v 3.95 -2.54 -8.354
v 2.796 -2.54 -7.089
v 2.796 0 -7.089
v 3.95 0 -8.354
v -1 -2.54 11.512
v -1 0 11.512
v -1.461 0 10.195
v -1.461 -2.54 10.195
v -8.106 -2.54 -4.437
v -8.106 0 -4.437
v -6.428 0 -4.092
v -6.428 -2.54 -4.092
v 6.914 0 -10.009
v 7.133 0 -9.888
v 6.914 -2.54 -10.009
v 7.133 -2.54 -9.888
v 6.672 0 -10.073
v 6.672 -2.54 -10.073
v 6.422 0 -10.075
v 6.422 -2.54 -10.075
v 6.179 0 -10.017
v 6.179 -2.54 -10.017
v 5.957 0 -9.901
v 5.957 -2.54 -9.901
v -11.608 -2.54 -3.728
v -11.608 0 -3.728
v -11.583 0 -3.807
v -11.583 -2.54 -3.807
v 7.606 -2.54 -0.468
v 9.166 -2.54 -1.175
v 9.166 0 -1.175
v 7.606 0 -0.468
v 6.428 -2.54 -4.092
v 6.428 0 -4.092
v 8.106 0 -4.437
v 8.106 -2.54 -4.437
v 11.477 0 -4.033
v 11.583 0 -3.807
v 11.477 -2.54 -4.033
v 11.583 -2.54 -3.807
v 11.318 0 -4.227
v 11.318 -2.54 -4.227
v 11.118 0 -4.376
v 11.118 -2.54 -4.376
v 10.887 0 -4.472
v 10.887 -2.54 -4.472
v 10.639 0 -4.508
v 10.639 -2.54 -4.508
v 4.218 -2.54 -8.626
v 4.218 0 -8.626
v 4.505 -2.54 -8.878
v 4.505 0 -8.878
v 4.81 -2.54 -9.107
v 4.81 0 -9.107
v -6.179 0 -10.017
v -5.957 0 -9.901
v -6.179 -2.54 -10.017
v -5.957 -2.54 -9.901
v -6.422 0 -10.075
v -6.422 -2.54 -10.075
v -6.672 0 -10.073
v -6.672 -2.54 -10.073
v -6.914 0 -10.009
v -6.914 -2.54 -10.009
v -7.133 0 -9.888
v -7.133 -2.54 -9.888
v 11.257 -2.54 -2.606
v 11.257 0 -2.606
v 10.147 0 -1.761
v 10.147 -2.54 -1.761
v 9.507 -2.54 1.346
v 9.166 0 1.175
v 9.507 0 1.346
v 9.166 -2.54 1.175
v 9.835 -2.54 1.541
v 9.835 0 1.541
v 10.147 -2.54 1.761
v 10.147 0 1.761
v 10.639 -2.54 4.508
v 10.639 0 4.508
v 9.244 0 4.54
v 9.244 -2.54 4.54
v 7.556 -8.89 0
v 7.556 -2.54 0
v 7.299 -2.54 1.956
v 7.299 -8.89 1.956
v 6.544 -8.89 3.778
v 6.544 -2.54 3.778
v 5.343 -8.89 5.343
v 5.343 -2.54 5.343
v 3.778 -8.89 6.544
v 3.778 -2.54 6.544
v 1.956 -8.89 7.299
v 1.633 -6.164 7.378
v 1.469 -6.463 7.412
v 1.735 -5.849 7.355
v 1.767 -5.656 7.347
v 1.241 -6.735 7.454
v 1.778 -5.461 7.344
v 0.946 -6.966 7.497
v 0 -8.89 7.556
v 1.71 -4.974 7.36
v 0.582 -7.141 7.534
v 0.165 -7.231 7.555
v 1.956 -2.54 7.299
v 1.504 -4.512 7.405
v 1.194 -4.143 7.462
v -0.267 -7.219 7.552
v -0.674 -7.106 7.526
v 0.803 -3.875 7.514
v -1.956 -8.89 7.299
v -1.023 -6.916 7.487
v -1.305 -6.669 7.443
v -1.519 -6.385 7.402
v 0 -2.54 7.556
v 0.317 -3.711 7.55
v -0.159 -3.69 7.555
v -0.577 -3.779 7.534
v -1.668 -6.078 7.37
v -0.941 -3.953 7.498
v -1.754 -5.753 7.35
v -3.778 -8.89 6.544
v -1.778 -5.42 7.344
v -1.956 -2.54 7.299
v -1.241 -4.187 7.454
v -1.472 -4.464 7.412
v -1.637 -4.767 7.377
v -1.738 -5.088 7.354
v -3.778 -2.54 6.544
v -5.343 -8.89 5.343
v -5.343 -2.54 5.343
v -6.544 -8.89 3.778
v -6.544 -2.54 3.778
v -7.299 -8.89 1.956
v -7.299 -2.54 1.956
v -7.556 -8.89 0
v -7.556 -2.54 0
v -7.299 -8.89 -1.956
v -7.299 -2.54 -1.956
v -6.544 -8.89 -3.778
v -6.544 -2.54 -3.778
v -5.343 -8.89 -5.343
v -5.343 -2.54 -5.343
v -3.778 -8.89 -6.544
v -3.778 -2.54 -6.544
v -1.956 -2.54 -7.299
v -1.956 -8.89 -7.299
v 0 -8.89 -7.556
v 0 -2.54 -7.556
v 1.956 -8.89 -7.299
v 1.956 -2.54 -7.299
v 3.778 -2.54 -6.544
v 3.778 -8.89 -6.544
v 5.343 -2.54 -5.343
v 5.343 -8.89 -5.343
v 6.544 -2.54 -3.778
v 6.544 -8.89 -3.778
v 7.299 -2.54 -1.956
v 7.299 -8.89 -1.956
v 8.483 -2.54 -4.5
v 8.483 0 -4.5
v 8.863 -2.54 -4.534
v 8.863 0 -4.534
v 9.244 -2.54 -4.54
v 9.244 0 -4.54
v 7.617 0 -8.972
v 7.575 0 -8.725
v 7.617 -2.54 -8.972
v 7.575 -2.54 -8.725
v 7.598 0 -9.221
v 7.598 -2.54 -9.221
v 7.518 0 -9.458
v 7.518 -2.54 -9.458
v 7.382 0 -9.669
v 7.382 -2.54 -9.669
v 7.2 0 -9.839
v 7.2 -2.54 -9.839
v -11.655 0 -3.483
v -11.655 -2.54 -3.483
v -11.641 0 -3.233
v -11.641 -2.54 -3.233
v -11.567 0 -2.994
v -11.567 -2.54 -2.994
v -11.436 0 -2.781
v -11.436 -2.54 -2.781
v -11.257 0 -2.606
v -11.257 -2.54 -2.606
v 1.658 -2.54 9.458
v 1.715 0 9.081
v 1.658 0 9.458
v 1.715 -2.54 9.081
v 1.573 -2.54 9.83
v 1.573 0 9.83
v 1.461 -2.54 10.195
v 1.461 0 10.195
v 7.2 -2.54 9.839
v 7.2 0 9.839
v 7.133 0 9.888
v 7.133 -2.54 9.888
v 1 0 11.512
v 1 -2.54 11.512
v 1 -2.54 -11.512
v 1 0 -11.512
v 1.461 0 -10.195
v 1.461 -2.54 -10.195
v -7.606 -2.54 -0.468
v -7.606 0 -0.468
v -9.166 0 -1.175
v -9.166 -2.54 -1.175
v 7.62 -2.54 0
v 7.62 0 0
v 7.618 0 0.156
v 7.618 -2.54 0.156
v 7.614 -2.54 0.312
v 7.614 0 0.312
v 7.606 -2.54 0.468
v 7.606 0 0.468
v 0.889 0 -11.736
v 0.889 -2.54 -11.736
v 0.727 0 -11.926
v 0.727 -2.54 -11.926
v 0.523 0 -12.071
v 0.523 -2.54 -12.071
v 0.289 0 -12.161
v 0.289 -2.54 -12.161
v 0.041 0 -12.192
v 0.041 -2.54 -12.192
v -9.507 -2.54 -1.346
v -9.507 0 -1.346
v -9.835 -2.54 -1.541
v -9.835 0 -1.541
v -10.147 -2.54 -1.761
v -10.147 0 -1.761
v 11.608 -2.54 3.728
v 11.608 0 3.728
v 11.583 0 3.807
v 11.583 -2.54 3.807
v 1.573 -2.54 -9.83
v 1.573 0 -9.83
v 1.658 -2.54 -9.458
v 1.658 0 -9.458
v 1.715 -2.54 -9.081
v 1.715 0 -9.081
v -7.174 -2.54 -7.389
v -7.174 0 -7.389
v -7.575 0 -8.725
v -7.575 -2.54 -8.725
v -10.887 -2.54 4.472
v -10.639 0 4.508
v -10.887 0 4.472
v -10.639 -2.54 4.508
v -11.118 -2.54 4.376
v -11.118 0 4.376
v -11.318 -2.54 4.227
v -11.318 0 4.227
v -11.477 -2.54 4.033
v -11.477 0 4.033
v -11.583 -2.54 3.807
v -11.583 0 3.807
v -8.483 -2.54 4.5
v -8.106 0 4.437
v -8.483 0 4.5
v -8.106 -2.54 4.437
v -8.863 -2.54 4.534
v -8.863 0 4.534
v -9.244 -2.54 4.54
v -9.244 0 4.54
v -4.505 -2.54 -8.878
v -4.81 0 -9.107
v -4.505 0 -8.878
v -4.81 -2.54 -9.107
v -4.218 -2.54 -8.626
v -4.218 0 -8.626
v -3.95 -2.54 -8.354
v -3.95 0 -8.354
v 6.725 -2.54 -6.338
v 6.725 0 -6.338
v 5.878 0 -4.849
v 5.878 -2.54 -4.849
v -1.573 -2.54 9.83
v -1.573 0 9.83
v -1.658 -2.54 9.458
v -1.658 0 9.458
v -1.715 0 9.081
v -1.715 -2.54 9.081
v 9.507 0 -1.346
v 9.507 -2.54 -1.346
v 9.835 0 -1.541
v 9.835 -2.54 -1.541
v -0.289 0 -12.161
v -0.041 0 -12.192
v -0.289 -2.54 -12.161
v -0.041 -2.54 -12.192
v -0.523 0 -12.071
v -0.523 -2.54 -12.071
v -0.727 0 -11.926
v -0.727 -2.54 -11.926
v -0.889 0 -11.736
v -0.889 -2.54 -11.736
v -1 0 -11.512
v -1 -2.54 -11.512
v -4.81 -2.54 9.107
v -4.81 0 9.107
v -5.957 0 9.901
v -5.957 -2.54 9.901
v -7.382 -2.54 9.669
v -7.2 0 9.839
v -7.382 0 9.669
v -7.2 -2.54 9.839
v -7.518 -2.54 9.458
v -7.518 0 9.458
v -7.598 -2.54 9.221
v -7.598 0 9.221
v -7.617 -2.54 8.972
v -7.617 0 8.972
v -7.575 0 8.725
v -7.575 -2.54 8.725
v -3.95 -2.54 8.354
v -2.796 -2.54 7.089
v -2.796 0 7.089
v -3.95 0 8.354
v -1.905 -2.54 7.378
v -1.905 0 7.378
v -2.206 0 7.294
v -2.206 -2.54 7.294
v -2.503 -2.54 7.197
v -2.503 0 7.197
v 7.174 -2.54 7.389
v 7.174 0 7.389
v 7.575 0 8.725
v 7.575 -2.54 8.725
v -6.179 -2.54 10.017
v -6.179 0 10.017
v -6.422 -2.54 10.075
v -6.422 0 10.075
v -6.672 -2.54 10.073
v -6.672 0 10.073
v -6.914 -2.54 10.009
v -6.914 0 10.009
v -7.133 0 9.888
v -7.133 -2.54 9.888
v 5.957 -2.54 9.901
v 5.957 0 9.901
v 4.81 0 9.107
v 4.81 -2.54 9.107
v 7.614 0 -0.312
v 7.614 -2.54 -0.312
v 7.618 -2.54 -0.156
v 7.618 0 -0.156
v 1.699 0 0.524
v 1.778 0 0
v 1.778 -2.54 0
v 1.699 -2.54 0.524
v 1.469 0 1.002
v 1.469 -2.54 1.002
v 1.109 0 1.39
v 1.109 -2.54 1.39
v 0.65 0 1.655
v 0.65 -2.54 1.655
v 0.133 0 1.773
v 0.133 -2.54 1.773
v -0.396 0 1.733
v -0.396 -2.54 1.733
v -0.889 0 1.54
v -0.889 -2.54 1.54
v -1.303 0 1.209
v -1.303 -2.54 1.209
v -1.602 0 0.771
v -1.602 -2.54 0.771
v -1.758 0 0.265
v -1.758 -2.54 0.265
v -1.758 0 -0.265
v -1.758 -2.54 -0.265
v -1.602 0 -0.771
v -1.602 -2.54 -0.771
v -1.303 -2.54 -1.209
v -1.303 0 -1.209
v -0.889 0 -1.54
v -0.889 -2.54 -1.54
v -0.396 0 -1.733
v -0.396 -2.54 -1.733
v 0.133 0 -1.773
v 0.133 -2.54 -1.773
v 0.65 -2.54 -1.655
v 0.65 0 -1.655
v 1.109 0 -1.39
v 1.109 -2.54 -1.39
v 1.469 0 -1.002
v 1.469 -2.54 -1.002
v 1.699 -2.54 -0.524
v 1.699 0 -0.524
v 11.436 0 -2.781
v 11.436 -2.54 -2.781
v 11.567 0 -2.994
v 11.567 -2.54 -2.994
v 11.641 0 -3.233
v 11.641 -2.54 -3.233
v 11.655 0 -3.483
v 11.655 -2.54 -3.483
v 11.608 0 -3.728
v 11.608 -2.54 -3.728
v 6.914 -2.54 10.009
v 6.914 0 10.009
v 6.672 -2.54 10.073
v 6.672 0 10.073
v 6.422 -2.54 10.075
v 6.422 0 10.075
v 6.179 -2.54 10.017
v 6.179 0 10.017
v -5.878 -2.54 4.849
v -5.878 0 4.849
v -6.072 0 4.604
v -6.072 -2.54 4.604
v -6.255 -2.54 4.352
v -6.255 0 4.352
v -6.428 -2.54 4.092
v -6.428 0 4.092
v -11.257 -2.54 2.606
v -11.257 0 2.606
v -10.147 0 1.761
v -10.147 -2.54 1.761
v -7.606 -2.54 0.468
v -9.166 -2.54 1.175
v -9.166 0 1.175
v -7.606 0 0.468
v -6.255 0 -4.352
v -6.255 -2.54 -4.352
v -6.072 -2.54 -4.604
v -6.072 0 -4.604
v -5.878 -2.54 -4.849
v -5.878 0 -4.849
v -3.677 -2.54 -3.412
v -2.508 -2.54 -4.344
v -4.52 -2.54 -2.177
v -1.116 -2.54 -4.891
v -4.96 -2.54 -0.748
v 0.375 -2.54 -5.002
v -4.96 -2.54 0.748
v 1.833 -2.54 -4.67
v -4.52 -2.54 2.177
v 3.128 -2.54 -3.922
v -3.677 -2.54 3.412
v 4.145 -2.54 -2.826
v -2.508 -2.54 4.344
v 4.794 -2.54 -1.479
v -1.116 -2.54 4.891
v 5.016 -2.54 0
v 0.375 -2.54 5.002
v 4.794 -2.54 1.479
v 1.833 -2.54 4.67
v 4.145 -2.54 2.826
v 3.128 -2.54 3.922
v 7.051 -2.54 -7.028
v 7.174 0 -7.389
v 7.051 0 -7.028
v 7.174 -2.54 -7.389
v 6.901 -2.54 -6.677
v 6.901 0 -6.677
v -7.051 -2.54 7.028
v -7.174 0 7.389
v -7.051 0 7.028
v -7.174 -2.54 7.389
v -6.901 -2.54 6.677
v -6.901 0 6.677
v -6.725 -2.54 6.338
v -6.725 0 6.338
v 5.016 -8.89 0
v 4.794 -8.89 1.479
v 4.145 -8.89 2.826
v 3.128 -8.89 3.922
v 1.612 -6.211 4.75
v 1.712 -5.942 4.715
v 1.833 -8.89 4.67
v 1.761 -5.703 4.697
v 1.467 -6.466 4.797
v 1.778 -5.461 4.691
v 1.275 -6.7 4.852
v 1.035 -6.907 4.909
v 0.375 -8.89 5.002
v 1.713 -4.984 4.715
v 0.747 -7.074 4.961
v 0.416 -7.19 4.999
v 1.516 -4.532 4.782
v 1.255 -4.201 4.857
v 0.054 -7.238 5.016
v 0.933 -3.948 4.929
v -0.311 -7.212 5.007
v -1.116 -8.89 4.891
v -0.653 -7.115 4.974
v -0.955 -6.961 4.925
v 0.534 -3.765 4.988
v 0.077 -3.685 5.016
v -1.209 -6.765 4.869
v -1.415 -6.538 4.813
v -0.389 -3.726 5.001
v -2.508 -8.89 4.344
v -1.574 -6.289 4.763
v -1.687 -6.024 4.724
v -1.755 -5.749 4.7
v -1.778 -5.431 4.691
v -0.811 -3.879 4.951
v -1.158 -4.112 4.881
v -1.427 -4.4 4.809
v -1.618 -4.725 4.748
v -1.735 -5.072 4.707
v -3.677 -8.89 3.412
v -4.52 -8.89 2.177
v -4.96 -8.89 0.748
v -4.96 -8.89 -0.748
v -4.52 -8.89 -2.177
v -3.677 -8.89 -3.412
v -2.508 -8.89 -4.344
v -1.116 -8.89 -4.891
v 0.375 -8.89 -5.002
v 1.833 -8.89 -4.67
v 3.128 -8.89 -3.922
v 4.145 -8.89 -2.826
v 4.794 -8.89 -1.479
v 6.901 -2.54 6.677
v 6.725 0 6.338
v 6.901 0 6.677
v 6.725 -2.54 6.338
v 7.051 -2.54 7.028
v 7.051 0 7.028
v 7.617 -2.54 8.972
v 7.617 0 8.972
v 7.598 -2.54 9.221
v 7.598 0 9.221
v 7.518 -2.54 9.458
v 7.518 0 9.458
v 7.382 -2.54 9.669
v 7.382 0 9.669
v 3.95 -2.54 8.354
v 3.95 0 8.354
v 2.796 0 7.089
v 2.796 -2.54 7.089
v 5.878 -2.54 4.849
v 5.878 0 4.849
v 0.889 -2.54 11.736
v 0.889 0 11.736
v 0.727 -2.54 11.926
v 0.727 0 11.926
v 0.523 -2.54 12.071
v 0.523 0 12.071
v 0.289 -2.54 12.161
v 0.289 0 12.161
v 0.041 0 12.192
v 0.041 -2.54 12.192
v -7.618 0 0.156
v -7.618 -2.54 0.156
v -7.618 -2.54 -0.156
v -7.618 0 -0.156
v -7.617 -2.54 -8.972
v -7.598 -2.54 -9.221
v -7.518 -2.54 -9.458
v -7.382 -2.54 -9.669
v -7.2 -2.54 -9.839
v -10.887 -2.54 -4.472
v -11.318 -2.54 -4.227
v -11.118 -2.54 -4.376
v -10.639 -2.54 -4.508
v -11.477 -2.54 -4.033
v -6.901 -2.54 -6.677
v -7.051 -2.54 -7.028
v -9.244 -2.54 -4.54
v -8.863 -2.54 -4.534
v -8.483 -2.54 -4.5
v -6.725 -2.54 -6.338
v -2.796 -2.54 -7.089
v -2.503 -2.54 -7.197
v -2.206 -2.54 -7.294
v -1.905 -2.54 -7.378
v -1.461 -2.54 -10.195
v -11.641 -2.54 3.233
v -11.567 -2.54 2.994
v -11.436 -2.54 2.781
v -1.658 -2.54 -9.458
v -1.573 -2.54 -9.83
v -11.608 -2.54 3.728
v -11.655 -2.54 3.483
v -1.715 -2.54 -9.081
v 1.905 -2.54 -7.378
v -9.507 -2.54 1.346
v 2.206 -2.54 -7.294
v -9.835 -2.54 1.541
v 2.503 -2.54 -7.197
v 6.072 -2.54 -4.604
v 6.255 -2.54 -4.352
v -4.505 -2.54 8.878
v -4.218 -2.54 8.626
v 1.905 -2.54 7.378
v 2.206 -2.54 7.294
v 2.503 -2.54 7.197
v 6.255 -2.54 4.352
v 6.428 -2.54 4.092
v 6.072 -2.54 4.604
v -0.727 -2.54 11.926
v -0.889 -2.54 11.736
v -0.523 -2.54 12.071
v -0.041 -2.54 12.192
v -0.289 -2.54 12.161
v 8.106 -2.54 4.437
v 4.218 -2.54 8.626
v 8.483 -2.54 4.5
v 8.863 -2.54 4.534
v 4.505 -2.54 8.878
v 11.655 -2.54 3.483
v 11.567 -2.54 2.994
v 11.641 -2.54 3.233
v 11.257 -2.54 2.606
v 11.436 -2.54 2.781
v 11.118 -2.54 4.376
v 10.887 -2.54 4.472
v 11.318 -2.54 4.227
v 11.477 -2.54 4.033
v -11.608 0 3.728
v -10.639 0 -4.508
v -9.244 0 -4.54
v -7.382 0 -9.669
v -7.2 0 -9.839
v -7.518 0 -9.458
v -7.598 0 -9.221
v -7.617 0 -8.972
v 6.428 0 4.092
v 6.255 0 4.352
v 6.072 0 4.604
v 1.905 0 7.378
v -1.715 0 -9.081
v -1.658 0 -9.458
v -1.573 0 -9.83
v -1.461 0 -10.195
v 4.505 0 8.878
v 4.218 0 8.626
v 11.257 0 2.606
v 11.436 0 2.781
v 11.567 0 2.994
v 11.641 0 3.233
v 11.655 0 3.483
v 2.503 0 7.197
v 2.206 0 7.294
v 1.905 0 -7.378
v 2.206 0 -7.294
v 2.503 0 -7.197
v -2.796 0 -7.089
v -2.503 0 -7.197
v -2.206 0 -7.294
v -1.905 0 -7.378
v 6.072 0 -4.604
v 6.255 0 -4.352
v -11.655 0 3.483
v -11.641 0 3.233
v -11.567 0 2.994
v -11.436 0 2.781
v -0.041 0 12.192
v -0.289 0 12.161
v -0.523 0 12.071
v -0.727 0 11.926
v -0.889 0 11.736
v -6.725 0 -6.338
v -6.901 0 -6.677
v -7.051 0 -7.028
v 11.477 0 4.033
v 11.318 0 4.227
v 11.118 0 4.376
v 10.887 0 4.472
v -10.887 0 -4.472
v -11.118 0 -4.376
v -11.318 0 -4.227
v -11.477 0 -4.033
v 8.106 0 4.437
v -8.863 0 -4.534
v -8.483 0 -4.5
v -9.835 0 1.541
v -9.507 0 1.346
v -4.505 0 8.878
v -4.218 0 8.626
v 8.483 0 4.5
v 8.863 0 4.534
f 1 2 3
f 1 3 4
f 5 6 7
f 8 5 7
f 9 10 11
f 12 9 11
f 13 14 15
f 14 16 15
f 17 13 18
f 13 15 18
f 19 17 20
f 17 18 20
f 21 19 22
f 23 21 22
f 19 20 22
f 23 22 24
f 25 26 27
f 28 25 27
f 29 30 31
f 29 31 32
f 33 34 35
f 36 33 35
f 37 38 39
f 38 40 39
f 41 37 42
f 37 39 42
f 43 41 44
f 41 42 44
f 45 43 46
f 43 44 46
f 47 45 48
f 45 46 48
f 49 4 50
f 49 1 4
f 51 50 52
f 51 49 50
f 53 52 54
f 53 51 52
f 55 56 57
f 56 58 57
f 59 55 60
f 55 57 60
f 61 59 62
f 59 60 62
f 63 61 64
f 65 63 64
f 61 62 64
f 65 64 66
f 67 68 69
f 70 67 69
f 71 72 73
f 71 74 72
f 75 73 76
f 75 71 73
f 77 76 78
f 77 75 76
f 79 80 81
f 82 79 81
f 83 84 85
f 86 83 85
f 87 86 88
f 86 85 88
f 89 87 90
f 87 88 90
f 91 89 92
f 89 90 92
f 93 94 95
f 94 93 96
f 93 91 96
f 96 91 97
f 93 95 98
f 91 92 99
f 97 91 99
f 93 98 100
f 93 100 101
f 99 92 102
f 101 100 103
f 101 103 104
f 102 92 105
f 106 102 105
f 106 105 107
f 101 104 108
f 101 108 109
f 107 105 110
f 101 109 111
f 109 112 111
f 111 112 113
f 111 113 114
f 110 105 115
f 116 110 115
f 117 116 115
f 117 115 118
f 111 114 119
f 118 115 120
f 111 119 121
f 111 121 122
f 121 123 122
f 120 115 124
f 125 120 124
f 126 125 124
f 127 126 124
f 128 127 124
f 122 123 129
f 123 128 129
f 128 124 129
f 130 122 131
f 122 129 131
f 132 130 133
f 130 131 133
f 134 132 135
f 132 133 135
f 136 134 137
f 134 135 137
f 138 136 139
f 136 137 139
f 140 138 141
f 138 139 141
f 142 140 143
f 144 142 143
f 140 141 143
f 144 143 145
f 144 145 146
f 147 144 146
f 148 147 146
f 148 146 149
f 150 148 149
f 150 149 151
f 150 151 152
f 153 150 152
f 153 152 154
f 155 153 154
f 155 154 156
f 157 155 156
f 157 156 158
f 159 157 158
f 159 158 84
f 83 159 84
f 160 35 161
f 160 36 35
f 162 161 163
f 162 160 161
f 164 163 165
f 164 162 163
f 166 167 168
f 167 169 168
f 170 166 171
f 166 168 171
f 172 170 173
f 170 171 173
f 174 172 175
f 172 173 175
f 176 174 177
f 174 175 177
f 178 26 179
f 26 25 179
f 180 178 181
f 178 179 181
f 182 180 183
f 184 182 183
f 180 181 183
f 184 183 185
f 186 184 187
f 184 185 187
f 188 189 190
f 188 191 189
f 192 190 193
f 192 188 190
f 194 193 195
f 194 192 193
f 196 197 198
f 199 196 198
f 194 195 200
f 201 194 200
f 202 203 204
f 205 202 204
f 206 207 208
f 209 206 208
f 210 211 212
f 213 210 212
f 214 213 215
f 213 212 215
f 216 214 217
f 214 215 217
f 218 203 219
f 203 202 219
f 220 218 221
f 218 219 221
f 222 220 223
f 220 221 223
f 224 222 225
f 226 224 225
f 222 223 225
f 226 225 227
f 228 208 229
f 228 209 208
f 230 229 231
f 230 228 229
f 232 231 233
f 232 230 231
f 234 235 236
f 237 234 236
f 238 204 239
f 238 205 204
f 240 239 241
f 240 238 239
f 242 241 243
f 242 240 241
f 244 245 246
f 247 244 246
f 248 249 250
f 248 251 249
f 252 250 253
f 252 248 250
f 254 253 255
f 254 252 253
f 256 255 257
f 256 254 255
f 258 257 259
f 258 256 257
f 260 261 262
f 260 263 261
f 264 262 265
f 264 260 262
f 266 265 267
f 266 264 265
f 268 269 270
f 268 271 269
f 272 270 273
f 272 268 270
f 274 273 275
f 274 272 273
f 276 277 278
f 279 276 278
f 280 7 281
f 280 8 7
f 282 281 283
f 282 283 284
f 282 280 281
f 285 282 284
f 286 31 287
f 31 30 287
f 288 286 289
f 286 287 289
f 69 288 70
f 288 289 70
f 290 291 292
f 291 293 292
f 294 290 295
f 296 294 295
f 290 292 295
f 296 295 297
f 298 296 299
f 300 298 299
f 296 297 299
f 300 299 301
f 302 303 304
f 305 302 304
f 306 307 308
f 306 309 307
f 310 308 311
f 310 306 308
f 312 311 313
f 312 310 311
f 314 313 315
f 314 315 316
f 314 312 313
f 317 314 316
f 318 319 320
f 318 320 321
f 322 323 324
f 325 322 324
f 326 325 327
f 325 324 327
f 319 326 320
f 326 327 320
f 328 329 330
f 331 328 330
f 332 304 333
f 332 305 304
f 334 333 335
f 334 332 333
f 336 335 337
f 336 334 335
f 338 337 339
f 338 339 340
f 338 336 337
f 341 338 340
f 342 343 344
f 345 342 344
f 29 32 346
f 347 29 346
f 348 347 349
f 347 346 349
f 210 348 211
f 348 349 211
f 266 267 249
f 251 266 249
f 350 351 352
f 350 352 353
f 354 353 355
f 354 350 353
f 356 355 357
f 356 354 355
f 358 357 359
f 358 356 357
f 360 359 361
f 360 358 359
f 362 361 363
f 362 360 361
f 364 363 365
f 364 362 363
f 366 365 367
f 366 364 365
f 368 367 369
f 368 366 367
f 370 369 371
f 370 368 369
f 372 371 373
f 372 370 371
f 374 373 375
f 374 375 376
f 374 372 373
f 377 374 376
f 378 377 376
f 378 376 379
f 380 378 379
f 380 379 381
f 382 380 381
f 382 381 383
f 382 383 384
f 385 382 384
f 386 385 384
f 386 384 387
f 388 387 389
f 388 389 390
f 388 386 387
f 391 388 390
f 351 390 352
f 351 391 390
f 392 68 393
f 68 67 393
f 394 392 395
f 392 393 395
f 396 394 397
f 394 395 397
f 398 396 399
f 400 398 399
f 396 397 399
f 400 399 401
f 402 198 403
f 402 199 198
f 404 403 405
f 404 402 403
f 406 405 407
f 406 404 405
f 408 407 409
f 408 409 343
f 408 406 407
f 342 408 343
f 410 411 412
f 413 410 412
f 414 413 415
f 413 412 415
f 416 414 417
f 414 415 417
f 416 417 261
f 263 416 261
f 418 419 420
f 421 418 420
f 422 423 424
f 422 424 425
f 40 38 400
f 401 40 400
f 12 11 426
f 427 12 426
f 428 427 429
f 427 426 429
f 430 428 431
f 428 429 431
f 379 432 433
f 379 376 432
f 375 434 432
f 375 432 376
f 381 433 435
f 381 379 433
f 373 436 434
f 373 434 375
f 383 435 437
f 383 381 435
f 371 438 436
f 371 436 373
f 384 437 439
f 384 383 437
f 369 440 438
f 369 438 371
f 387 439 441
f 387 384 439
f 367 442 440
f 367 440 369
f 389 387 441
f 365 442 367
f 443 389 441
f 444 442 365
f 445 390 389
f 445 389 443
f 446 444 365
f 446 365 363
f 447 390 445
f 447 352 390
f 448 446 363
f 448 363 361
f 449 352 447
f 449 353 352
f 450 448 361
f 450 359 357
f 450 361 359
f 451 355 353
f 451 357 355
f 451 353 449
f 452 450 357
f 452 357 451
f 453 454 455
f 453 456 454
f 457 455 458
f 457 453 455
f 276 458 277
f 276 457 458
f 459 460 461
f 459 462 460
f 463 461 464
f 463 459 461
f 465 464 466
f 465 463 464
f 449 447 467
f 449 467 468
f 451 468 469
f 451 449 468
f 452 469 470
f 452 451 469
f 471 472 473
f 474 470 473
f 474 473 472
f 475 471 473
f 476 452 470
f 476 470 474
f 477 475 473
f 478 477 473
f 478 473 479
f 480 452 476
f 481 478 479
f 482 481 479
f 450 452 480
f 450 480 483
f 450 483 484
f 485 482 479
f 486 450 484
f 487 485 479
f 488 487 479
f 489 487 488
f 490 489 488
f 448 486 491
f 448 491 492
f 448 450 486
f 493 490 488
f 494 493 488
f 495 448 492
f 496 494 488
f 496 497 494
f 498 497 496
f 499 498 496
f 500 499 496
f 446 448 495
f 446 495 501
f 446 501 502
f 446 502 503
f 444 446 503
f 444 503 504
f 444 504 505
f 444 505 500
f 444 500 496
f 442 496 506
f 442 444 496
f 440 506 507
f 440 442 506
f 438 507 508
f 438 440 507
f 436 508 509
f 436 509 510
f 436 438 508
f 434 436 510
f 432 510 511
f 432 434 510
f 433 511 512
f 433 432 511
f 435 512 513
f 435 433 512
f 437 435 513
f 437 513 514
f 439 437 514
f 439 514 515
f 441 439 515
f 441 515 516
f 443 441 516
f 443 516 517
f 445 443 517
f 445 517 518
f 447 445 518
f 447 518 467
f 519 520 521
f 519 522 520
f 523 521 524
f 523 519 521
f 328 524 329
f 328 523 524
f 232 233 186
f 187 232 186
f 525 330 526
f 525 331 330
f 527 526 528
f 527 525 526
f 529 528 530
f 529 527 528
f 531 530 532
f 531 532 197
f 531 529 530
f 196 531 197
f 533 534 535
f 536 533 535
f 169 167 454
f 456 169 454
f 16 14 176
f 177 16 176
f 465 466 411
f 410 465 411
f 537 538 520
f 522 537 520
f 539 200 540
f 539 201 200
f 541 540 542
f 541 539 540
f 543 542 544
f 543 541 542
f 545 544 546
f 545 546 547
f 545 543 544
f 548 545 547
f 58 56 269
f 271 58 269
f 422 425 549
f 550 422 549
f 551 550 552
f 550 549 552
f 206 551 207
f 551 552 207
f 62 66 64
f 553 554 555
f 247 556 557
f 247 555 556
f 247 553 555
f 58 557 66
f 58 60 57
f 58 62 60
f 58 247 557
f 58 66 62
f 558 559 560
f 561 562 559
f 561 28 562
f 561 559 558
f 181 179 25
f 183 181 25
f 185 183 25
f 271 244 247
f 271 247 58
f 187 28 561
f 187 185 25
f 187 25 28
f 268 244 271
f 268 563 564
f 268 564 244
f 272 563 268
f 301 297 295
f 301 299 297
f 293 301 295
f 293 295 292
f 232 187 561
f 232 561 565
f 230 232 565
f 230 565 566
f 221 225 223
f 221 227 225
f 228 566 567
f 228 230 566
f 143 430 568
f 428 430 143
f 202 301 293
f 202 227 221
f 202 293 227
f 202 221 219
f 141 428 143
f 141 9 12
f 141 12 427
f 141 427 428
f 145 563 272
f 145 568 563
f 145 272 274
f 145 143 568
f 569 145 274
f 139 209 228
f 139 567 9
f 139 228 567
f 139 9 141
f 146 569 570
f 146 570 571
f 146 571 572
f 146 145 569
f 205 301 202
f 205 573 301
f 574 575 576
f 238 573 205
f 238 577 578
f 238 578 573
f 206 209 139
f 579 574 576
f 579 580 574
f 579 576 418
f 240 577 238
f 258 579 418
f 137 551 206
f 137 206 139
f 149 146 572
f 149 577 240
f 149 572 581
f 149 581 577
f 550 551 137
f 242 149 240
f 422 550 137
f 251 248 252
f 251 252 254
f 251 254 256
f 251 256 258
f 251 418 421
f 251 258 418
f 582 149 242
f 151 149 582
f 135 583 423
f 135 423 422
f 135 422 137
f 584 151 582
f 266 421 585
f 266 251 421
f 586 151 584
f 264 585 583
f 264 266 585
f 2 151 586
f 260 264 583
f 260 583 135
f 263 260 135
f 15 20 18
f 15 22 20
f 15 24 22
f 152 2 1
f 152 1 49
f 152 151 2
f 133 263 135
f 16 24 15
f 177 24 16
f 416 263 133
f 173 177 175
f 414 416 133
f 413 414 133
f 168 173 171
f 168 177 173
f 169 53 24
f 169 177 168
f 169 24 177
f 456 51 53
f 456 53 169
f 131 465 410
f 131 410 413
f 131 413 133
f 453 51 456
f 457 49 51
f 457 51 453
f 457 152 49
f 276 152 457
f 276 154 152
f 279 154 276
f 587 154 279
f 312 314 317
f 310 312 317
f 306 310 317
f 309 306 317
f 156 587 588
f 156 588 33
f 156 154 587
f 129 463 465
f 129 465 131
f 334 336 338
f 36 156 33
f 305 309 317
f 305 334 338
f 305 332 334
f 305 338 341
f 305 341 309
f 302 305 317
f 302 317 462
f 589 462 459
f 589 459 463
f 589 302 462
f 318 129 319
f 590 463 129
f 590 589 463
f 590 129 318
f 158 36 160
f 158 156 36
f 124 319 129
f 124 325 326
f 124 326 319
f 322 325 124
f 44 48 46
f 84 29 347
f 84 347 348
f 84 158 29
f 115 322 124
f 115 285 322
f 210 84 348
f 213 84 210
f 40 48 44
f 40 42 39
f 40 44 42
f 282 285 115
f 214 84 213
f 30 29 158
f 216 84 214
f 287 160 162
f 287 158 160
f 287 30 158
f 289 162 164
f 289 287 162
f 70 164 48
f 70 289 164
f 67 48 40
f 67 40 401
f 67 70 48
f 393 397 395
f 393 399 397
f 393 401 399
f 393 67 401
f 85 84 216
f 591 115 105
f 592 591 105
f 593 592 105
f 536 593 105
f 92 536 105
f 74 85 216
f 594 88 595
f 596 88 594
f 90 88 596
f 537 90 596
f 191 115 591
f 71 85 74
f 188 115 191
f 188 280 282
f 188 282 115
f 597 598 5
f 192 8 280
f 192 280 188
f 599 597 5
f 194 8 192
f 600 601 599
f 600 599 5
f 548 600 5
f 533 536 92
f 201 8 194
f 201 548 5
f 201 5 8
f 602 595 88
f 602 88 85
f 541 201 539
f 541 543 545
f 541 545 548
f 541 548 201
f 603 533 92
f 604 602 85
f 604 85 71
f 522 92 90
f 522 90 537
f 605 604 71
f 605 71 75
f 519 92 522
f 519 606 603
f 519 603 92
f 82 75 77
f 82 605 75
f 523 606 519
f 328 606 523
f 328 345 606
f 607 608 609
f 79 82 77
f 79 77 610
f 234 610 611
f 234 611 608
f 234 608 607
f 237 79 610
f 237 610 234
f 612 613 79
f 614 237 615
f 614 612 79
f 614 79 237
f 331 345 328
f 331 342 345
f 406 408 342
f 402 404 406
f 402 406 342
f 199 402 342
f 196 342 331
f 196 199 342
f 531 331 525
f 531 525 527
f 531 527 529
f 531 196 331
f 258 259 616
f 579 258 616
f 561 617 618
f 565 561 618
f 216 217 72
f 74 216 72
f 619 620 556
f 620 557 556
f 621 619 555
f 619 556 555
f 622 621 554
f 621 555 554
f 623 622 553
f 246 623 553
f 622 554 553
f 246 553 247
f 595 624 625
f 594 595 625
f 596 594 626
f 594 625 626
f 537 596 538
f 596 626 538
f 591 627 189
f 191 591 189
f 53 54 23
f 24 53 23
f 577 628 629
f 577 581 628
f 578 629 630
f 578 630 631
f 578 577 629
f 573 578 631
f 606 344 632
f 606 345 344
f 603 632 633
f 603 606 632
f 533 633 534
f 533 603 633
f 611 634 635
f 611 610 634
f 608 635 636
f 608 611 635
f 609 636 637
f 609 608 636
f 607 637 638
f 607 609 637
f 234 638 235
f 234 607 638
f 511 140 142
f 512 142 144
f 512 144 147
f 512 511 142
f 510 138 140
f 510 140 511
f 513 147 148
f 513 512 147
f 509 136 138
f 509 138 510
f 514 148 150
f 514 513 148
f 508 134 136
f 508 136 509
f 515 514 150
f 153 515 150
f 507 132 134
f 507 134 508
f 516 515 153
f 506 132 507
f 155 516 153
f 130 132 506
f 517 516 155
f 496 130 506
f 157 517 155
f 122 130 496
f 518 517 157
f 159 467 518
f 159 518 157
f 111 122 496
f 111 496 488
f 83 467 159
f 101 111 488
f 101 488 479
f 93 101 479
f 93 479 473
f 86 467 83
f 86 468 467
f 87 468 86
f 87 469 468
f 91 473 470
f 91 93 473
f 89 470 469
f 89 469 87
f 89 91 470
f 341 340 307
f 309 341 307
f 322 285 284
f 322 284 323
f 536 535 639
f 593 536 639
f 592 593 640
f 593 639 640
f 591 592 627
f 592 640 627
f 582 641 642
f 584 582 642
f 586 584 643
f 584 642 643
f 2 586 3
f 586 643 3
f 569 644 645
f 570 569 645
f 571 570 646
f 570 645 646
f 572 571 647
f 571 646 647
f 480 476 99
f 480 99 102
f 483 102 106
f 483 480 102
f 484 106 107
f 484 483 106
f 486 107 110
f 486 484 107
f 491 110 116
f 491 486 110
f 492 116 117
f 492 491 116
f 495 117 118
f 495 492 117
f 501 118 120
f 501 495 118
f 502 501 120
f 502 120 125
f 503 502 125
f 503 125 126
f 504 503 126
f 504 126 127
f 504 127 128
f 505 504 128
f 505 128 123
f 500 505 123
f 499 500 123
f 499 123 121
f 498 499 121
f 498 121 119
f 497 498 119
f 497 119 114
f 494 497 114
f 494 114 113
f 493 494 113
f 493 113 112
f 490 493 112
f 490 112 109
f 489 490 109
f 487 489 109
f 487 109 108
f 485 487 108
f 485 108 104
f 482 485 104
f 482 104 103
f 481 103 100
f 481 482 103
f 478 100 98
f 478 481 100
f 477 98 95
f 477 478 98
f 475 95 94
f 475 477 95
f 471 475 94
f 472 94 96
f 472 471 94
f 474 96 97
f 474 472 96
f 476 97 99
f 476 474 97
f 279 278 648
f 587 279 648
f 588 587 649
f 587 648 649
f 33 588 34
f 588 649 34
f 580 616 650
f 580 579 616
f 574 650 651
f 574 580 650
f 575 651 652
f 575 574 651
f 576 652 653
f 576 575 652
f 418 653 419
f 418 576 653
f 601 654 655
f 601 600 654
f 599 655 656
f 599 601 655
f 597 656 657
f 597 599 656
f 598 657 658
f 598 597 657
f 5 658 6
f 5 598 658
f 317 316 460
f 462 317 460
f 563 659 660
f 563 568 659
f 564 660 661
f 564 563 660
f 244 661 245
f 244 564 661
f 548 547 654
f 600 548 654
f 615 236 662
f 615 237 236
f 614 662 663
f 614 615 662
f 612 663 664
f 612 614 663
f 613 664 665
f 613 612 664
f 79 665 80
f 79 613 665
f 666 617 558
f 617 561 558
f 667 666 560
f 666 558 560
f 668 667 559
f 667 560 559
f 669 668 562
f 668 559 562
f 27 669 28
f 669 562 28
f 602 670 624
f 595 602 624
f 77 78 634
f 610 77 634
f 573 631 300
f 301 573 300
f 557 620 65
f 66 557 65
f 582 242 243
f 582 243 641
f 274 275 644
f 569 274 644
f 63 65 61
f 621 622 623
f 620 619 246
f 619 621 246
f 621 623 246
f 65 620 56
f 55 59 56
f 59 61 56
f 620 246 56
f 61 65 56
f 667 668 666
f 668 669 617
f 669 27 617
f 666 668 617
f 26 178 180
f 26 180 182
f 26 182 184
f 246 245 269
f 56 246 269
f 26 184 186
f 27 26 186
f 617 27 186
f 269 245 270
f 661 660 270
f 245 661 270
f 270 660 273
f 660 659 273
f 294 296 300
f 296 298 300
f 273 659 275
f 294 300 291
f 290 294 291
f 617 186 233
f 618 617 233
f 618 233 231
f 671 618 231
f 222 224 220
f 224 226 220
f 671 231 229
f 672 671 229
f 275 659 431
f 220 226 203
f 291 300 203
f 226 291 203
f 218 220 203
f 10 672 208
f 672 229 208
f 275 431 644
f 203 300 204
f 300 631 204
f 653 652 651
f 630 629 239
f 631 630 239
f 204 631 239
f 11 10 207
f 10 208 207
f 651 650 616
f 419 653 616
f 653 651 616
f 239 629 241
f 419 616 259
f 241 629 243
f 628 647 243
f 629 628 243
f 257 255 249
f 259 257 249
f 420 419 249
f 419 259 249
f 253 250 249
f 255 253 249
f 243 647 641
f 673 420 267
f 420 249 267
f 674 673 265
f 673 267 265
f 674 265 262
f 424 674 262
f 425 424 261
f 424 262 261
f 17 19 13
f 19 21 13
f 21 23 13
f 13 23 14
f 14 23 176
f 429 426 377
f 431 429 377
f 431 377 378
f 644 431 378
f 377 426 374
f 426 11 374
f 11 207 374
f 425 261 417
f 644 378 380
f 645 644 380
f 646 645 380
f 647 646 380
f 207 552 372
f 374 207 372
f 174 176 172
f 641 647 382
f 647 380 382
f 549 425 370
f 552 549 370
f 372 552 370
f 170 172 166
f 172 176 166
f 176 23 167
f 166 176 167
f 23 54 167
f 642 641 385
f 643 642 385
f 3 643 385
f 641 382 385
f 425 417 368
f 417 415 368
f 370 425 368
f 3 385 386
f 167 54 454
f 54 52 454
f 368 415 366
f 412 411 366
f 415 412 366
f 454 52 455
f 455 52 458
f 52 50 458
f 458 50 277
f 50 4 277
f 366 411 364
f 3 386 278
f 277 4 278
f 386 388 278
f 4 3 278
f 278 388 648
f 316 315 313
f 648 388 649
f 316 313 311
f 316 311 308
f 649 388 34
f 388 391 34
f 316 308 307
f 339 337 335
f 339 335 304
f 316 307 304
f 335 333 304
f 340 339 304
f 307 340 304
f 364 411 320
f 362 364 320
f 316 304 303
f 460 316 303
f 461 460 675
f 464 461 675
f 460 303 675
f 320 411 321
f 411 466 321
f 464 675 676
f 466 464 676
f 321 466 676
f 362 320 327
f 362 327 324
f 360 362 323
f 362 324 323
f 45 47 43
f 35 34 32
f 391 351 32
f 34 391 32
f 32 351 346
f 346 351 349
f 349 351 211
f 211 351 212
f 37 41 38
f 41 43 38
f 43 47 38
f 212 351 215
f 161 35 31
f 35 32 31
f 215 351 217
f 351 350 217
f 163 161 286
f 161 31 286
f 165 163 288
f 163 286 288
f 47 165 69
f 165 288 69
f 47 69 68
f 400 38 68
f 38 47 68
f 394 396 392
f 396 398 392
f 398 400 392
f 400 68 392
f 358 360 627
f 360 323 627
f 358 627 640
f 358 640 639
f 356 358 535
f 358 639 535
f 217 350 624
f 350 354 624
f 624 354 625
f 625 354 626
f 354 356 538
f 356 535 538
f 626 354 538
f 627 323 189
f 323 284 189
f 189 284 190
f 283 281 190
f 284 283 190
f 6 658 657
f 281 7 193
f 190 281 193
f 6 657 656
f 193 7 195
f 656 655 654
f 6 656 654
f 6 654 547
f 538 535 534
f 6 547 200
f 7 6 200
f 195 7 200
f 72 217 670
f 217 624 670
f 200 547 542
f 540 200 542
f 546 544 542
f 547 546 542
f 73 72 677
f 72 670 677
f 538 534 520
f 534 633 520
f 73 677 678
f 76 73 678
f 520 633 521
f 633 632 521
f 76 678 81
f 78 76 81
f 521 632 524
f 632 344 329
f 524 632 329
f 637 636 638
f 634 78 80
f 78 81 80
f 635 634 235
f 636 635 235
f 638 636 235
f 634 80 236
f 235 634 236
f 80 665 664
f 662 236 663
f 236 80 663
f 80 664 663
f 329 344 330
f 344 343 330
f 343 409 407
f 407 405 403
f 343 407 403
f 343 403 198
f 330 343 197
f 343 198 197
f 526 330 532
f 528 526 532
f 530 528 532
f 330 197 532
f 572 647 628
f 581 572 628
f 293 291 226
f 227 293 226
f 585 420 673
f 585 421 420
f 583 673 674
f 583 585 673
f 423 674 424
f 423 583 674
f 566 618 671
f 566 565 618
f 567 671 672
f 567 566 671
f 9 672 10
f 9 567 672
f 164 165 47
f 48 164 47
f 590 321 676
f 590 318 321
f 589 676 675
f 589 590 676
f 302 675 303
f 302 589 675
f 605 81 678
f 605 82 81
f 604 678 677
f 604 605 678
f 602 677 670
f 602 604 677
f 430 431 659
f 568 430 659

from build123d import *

# Parameters (mm, degrees)
F0_R     = 1.778
F1_DEPTH = 2.54
F2_R     = 7.5565
F2_R_2   = 5.0165
F3_DEPTH = 6.35
F4_R     = 5.08
F5_R     = 1.016
F6_R     = 1.778
F7_DEPTH = 25.4


with BuildPart() as f1:
    # F0 (on Front) → F1 (new body)
    with BuildSketch(Plane.XZ):
        with BuildLine():
            ThreePointArc((7.605604, -0.468175), (7.6164, -0.234198), (7.62, 0))
            ThreePointArc((7.62, 0), (7.6164, 0.234198), (7.605604, 0.468175))
            ThreePointArc((7.605604, 0.468175), (7.247051, 2.354709), (6.428249, 4.0917))
            ThreePointArc((6.428249, 4.0917), (6.164709, 4.478924), (5.877877, 4.849223))
            ThreePointArc((5.877877, 4.849223), (4.478924, 6.164709), (2.795522, 7.088685))
            ThreePointArc((2.795522, 7.088685), (2.354709, 7.247051), (1.905, 7.378033))
            ThreePointArc((1.905, 7.378033), (0, 7.62), (-1.905, 7.378033))
            ThreePointArc((-1.905, 7.378033), (-2.354709, 7.247051), (-2.795522, 7.088685))
            ThreePointArc((-2.795522, 7.088685), (-4.478924, 6.164709), (-5.877877, 4.849223))
            ThreePointArc((-5.877877, 4.849223), (-6.164709, 4.478924), (-6.428249, 4.0917))
            ThreePointArc((-6.428249, 4.0917), (-7.247051, 2.354709), (-7.605604, 0.468175))
            ThreePointArc((-7.605604, 0.468175), (-7.62, 0), (-7.605604, -0.468175))
            ThreePointArc((-7.605604, -0.468175), (-7.247051, -2.354709), (-6.428249, -4.0917))
            ThreePointArc((-6.428249, -4.0917), (-6.164709, -4.478924), (-5.877877, -4.849223))
            ThreePointArc((-5.877877, -4.849223), (-4.478924, -6.164709), (-2.795522, -7.088685))
            ThreePointArc((-2.795522, -7.088685), (-2.354709, -7.247051), (-1.905, -7.378033))
            ThreePointArc((-1.905, -7.378033), (0, -7.62), (1.905, -7.378033))
            ThreePointArc((1.905, -7.378033), (2.354709, -7.247051), (2.795522, -7.088685))
            ThreePointArc((2.795522, -7.088685), (4.478924, -6.164709), (5.877877, -4.849223))
            ThreePointArc((5.877877, -4.849223), (6.164709, -4.478924), (6.428249, -4.0917))
            ThreePointArc((6.428249, -4.0917), (7.247051, -2.354709), (7.605604, -0.468175))
        make_face()
        Circle(F0_R, mode=Mode.SUBTRACT)
        with BuildLine():
            ThreePointArc((6.428249, 4.0917), (7.247051, 2.354709), (7.605604, 0.468175))
            Line((7.605604, 0.468175), (9.689785, 1.412438))
            Line((9.689785, 1.412438), (11.830752, 3.04283))
            Line((11.830752, 3.04283), (11.35981, 4.49224))
            Line((11.35981, 4.49224), (8.66941, 4.552826))
            Line((8.66941, 4.552826), (6.428249, 4.0917))
        make_face()
        with BuildLine():
            Line((9.689785, -1.412438), (7.605604, -0.468175))
            ThreePointArc((7.605604, -0.468175), (7.247051, -2.354709), (6.428249, -4.0917))
            Line((6.428249, -4.0917), (8.66941, -4.552826))
            Line((8.66941, -4.552826), (11.35981, -4.49224))
            Line((11.35981, -4.49224), (11.830752, -3.04283))
            Line((11.830752, -3.04283), (9.689785, -1.412438))
        make_face()
        with BuildLine():
            ThreePointArc((2.795522, 7.088685), (4.478924, 6.164709), (5.877877, 4.849223))
            Line((5.877877, 4.849223), (7.00899, 6.838199))
            Line((7.00899, 6.838199), (7.782749, 9.415643))
            Line((7.782749, 9.415643), (6.549807, 10.311428))
            Line((6.549807, 10.311428), (4.337616, 8.779065))
            Line((4.337616, 8.779065), (2.795522, 7.088685))
        make_face()
        with BuildLine():
            Line((7.00899, -6.838199), (5.877877, -4.849223))
            ThreePointArc((5.877877, -4.849223), (4.478924, -6.164709), (2.795522, -7.088685))
            Line((2.795522, -7.088685), (4.337616, -8.779065))
            Line((4.337616, -8.779065), (6.549807, -10.311428))
            Line((6.549807, -10.311428), (7.782749, -9.415643))
            Line((7.782749, -9.415643), (7.00899, -6.838199))
        make_face()
        with BuildLine():
            ThreePointArc((-1.905, 7.378033), (0, 7.62), (1.905, 7.378033))
            Line((1.905, 7.378033), (1.651, 9.652))
            Line((1.651, 9.652), (0.762, 12.192))
            Line((0.762, 12.192), (-0.762, 12.192))
            Line((-0.762, 12.192), (-1.651, 9.652))
            Line((-1.651, 9.652), (-1.905, 7.378033))
        make_face()
        with BuildLine():
            Line((1.651, -9.652), (1.905, -7.378033))
            ThreePointArc((1.905, -7.378033), (0, -7.62), (-1.905, -7.378033))
            Line((-1.905, -7.378033), (-1.651, -9.652))
            Line((-1.651, -9.652), (-0.762, -12.192))
            Line((-0.762, -12.192), (0.762, -12.192))
            Line((0.762, -12.192), (1.651, -9.652))
        make_face()
        with BuildLine():
            ThreePointArc((-5.877877, 4.849223), (-4.478924, 6.164709), (-2.795522, 7.088685))
            Line((-2.795522, 7.088685), (-4.337616, 8.779065))
            Line((-4.337616, 8.779065), (-6.549807, 10.311428))
            Line((-6.549807, 10.311428), (-7.782749, 9.415643))
            Line((-7.782749, 9.415643), (-7.00899, 6.838199))
            Line((-7.00899, 6.838199), (-5.877877, 4.849223))
        make_face()
        with BuildLine():
            Line((-4.337616, -8.779065), (-2.795522, -7.088685))
            ThreePointArc((-2.795522, -7.088685), (-4.478924, -6.164709), (-5.877877, -4.849223))
            Line((-5.877877, -4.849223), (-7.00899, -6.838199))
            Line((-7.00899, -6.838199), (-7.782749, -9.415643))
            Line((-7.782749, -9.415643), (-6.549807, -10.311428))
            Line((-6.549807, -10.311428), (-4.337616, -8.779065))
        make_face()
        with BuildLine():
            ThreePointArc((-7.605604, 0.468175), (-7.247051, 2.354709), (-6.428249, 4.0917))
            Line((-6.428249, 4.0917), (-8.66941, 4.552826))
            Line((-8.66941, 4.552826), (-11.35981, 4.49224))
            Line((-11.35981, 4.49224), (-11.830752, 3.04283))
            Line((-11.830752, 3.04283), (-9.689785, 1.412438))
            Line((-9.689785, 1.412438), (-7.605604, 0.468175))
        make_face()
        with BuildLine():
            Line((-8.66941, -4.552826), (-6.428249, -4.0917))
            ThreePointArc((-6.428249, -4.0917), (-7.247051, -2.354709), (-7.605604, -0.468175))
            Line((-7.605604, -0.468175), (-9.689785, -1.412438))
            Line((-9.689785, -1.412438), (-11.830752, -3.04283))
            Line((-11.830752, -3.04283), (-11.35981, -4.49224))
            Line((-11.35981, -4.49224), (-8.66941, -4.552826))
        make_face()
    extrude(amount=F1_DEPTH)

    # F2 (on face) → F3 (join)
    with BuildSketch(Plane.XZ.offset(2.54)):
        Circle(F2_R)
        Circle(F2_R_2, mode=Mode.SUBTRACT)
    extrude(amount=F3_DEPTH)

    # F4
    f4_edges = [f1.edges().sort_by_distance(p)[0] for p in [
        (7.00899, -1.27, 6.838199),
        (4.337616, -1.27, 8.779065),
        (1.651, -1.27, 9.652),
        (-4.337616, -1.27, 8.779065),
        (-8.66941, -1.27, 4.552826),
        (-9.689785, -1.27, -1.412438),
        (-7.00899, -1.27, -6.838199),
        (-1.651, -1.27, -9.652),
        (4.337616, -1.27, -8.779065),
        (8.66941, -1.27, -4.552826),
        (9.689785, -1.27, 1.412438),
        (9.689785, -1.27, -1.412438),
        (8.66941, -1.27, 4.552826),
        (-1.651, -1.27, 9.652),
        (-7.00899, -1.27, 6.838199),
        (-9.689785, -1.27, 1.412438),
        (-8.66941, -1.27, -4.552826),
        (-4.337616, -1.27, -8.779065),
        (1.651, -1.27, -9.652),
        (7.00899, -1.27, -6.838199),
    ]]
    fillet(f4_edges, radius=F4_R)

    # F5
    f5_edges = [f1.edges().sort_by_distance(p)[0] for p in [
        (0.762, -1.27, 12.192),
        (-0.762, -1.27, 12.192),
        (-6.549807, -1.27, 10.311428),
        (-7.782749, -1.27, 9.415643),
        (-11.35981, -1.27, 4.49224),
        (6.549807, -1.27, 10.311428),
        (7.782749, -1.27, 9.415643),
        (11.35981, -1.27, 4.49224),
        (-11.830752, -1.27, 3.04283),
        (-11.830752, -1.27, -3.04283),
        (-11.35981, -1.27, -4.49224),
        (-7.782749, -1.27, -9.415643),
        (-6.549807, -1.27, -10.311428),
        (-0.762, -1.27, -12.192),
        (0.762, -1.27, -12.192),
        (6.549807, -1.27, -10.311428),
        (7.782749, -1.27, -9.415643),
        (11.830752, -1.27, -3.04283),
        (11.35981, -1.27, -4.49224),
        (11.830752, -1.27, 3.04283),
    ]]
    fillet(f5_edges, radius=F5_R)

    # F6 (on Top) → F7 (cut)
    with BuildSketch(Plane.XY):
        with Locations((0, -5.461)):
            Circle(F6_R)
    extrude(amount=F7_DEPTH, mode=Mode.SUBTRACT)


solid = f1.part
